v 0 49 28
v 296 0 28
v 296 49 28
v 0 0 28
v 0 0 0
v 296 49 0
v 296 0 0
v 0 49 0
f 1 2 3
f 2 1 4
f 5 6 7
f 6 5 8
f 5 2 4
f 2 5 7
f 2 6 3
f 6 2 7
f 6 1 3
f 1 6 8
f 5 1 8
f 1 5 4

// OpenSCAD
include <../src/wardrobe.scad>;
plank_zy_middle();
//github_openscad -o wardrobe_2/plank_zy_middle.stl -D wardrobe_n=2 -D cutting_edge=0 -D break_view_length=0 wardrobe_2/plank_zy_middle_stl.scad
